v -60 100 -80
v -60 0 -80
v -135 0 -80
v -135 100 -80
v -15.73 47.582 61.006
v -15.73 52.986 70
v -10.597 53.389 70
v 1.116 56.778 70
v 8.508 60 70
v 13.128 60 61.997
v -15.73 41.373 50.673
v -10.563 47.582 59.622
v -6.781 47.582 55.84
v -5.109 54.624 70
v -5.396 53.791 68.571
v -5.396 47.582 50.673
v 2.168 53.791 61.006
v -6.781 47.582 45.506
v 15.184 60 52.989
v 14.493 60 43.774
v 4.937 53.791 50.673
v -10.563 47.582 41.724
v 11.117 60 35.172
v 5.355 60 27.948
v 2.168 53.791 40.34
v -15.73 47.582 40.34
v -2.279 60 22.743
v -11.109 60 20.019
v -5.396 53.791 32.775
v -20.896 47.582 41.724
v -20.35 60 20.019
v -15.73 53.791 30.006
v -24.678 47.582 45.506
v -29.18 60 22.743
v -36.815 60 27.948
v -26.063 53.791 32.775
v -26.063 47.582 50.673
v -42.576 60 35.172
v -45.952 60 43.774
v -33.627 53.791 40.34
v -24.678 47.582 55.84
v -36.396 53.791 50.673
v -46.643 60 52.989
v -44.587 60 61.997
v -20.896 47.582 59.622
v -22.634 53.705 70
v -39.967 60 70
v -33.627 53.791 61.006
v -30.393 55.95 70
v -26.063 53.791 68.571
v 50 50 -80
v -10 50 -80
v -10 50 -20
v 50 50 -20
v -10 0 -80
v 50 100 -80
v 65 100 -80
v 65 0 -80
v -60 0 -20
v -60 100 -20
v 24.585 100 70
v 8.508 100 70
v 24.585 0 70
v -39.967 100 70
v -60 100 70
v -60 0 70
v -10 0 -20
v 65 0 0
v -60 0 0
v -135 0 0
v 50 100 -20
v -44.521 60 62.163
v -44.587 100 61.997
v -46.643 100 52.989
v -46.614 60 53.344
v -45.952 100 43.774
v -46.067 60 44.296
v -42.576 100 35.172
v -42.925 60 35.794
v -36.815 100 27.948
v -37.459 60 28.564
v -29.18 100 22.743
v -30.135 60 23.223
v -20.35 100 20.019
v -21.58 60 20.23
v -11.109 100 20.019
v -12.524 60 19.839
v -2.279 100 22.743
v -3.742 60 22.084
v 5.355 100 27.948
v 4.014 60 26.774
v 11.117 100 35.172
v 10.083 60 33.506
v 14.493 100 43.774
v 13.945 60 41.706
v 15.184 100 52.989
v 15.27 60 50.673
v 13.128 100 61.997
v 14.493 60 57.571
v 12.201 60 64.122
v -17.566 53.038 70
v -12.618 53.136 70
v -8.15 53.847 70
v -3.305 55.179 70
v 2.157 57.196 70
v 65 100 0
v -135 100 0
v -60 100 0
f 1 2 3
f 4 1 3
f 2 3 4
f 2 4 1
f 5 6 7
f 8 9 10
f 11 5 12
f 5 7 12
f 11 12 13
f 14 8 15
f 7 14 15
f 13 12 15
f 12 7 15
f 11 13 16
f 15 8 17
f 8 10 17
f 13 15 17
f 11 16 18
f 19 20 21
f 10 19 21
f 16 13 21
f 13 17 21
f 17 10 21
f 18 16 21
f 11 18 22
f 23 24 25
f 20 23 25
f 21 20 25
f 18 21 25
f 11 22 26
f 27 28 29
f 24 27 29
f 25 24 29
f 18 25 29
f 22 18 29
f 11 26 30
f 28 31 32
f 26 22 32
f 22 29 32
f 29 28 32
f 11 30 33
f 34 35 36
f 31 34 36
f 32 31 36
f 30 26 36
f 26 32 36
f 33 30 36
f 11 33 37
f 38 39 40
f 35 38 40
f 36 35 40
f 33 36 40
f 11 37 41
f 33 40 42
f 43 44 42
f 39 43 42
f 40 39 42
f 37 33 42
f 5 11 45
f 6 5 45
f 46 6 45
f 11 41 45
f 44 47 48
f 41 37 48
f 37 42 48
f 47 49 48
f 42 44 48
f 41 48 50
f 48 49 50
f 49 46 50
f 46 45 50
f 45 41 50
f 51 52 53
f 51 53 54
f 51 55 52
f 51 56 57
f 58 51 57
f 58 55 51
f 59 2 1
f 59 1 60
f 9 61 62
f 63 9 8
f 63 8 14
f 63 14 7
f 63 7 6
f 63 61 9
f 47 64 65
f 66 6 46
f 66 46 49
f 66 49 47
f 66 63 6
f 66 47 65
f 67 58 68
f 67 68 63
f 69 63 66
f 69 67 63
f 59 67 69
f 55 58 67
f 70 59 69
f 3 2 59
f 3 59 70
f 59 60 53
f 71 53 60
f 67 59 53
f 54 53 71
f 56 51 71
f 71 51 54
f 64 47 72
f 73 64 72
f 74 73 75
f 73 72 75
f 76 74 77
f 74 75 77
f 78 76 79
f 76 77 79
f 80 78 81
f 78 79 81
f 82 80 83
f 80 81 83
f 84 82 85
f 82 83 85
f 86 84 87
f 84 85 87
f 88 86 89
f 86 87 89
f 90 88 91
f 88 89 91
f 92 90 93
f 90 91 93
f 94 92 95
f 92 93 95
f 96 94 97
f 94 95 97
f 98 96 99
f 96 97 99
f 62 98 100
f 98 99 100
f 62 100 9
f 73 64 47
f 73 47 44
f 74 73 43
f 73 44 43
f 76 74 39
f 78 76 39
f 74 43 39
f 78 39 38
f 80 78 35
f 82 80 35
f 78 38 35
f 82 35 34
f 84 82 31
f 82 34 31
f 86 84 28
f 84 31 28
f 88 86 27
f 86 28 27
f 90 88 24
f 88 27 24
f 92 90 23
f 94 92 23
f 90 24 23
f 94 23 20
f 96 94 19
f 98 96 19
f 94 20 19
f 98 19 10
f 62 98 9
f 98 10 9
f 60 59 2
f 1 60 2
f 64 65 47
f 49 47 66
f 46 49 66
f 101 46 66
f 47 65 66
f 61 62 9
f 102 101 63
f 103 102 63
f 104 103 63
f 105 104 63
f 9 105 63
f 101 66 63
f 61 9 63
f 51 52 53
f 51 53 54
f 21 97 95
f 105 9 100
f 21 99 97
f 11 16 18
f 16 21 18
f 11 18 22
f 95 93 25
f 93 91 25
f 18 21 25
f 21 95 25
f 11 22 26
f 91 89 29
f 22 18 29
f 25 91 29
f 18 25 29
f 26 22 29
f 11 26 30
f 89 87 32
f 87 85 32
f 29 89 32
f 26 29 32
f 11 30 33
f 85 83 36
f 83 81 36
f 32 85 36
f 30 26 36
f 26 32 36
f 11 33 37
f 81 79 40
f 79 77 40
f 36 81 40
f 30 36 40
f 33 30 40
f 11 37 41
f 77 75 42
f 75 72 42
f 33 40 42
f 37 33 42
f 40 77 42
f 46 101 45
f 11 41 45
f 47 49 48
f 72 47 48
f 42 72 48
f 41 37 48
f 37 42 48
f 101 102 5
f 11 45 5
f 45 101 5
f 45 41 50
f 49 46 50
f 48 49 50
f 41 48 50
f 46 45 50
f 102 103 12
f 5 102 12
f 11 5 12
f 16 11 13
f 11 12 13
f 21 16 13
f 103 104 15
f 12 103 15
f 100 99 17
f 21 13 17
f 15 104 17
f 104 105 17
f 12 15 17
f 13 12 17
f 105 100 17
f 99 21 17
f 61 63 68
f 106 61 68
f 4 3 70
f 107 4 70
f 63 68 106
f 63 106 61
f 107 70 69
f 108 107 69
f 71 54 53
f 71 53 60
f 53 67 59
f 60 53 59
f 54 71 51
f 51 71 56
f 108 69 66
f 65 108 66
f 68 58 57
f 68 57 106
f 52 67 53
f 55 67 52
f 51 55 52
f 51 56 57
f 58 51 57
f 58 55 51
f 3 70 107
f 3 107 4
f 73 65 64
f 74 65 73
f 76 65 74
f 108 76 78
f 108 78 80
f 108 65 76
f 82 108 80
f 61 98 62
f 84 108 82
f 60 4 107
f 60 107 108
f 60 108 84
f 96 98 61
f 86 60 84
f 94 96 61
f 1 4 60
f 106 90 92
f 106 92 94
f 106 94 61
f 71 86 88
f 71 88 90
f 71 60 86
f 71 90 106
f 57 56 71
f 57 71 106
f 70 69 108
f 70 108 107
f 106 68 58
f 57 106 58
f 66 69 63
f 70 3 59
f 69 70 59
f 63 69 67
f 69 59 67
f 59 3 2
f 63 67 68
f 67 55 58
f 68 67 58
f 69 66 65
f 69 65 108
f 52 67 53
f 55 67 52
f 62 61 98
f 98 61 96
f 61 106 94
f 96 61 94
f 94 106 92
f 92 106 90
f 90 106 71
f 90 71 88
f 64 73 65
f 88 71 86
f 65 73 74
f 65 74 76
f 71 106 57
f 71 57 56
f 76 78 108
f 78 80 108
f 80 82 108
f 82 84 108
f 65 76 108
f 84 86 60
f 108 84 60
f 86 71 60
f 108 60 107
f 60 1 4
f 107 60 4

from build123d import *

# Parameters (mm, degrees)
BOSS_EXTRUDE1_DEPTH              = 100
TAP_DRILL_FOR_M68X6_0_TAP1_D     = 62
TAP_DRILL_FOR_M68X6_0_TAP1_DEPTH = 40
TAP_DRILL_FOR_M68X6_0_TAP1_TIP   = 18.62667919
SKETCH4_W                        = 60
SKETCH4_H                        = 60
CUT_EXTRUDE1_DEPTH               = 50
BODY_MOVE_COPY1_DEPTH            = 100
BODY_MOVE_COPY1_2_OUTLINE_W      = 60
BODY_MOVE_COPY1_2_OUTLINE_H      = 60
BODY_MOVE_COPY1_2_DEPTH          = 50
BODY_MOVE_COPY1_START            = 50
BODY_MOVE_COPY1_3_DEPTH          = 10


with BuildPart() as part:
    # Sketch1 → Boss-Extrude1 (new body)
    with BuildSketch(Plane(origin=(0, 0, 0), x_dir=(1, 0, 0), z_dir=(0, 1, 0))):
        Polygon((-135, 0), (-135, 80), (-60, 80), (-60, 20), (-10, 20), (-10, 80), (65, 80), (65, 0), (24.585481157, -70), (-60, -70), (-60, 0), align=None)
    extrude(amount=BOSS_EXTRUDE1_DEPTH)

    # Tap Drill for M68x6.0 Tap1
    with Locations(Plane(origin=(-15.729505574, 100, 50.672948166), x_dir=(0, 0, 1), z_dir=(0, 1, 0))):
        with Locations((0, 0)):
            Hole(TAP_DRILL_FOR_M68X6_0_TAP1_D / 2, depth=TAP_DRILL_FOR_M68X6_0_TAP1_DEPTH)
            with Locations((0, 0, -(TAP_DRILL_FOR_M68X6_0_TAP1_DEPTH + TAP_DRILL_FOR_M68X6_0_TAP1_TIP / 2))):  # 118° drill point
                Cone(0, TAP_DRILL_FOR_M68X6_0_TAP1_D / 2, TAP_DRILL_FOR_M68X6_0_TAP1_TIP, mode=Mode.SUBTRACT)

    # Sketch4 → Cut-Extrude1 (cut)
    with BuildSketch(Plane(origin=(0, 100, 0), x_dir=(1, 0, 0), z_dir=(0, 1, 0))):
        with Locations((20, 50)):
            Rectangle(SKETCH4_W, SKETCH4_H)
    extrude(amount=-CUT_EXTRUDE1_DEPTH, mode=Mode.SUBTRACT)


with BuildPart() as body_2:
    # Body-Move/Copy1: read off the stored shape, not the designer's step
    # Body-Move/Copy1 outline → Body-Move/Copy1 (new body)
    with BuildSketch(Plane(origin=(0, 0, 0), x_dir=(1, 0, 0), z_dir=(0, 1, 0))):
        with BuildLine():
            Line((50, 20), (-60, 20))
            Line((-60, 20), (-60, 80))
            Line((-60, 80), (-135, 80))
            Line((-135, 80), (-135, 0))
            Line((-135, 0), (-60, 0))
            Line((-60, 0), (-60, -70))
            Line((-60, -70), (-39.967184246, -70))
            ThreePointArc((-39.967184246, -70), (-15.729505575, -19.672948166), (8.508173097, -70))
            Line((8.508173097, -70), (24.585481157, -70))
            Line((24.585481157, -70), (65, 0))
            Line((65, 0), (65, 80))
            Line((65, 80), (50, 80))
            Line((50, 80), (50, 20))
        make_face()
    extrude(amount=BODY_MOVE_COPY1_DEPTH)

    # Body-Move_Copy1 2 outline → Body-Move_Copy1 2 (add)
    with BuildSketch(Plane(origin=(0, 0, 0), x_dir=(1, 0, 0), z_dir=(0, 1, 0))):
        with Locations((20, 50)):
            Rectangle(BODY_MOVE_COPY1_2_OUTLINE_W, BODY_MOVE_COPY1_2_OUTLINE_H)
        with BuildLine():
            Line((-39.967184246, -70), (8.508173097, -70))
            ThreePointArc((8.508173097, -70), (-15.729505575, -19.672948166), (-39.967184246, -70))
        make_face()
    extrude(amount=BODY_MOVE_COPY1_2_DEPTH)

    # Body-Move_Copy1 3 outline → Body-Move_Copy1 3 (add)
    with BuildSketch(Plane(origin=(0, 0, 0), x_dir=(1, 0, 0), z_dir=(0, 1, 0)).offset(BODY_MOVE_COPY1_START)):
        with BuildLine():
            Line((-39.967184246, -70), (8.508173097, -70))
            ThreePointArc((8.508173097, -70), (-15.729505575, -19.672948166), (-39.967184246, -70))
        make_face()
    extrude(amount=BODY_MOVE_COPY1_3_DEPTH)

    # Body-Move_Copy1 4 outline → Body-Move_Copy1 4 (revolve, cut)
    with BuildSketch(Plane(origin=(-15.729505574, 0, 50.672948166), x_dir=(1, 0, 0), z_dir=(0, 0, 1))):
        Polygon((0, 60.000000051), (0, 41.37332081), (31.000000085, 60.000000051), align=None)
    revolve(axis=Axis((-15.729505574, 0, 50.672948166), (0, 1, 0)), mode=Mode.SUBTRACT)


solid = Compound([part.part, body_2.part])
